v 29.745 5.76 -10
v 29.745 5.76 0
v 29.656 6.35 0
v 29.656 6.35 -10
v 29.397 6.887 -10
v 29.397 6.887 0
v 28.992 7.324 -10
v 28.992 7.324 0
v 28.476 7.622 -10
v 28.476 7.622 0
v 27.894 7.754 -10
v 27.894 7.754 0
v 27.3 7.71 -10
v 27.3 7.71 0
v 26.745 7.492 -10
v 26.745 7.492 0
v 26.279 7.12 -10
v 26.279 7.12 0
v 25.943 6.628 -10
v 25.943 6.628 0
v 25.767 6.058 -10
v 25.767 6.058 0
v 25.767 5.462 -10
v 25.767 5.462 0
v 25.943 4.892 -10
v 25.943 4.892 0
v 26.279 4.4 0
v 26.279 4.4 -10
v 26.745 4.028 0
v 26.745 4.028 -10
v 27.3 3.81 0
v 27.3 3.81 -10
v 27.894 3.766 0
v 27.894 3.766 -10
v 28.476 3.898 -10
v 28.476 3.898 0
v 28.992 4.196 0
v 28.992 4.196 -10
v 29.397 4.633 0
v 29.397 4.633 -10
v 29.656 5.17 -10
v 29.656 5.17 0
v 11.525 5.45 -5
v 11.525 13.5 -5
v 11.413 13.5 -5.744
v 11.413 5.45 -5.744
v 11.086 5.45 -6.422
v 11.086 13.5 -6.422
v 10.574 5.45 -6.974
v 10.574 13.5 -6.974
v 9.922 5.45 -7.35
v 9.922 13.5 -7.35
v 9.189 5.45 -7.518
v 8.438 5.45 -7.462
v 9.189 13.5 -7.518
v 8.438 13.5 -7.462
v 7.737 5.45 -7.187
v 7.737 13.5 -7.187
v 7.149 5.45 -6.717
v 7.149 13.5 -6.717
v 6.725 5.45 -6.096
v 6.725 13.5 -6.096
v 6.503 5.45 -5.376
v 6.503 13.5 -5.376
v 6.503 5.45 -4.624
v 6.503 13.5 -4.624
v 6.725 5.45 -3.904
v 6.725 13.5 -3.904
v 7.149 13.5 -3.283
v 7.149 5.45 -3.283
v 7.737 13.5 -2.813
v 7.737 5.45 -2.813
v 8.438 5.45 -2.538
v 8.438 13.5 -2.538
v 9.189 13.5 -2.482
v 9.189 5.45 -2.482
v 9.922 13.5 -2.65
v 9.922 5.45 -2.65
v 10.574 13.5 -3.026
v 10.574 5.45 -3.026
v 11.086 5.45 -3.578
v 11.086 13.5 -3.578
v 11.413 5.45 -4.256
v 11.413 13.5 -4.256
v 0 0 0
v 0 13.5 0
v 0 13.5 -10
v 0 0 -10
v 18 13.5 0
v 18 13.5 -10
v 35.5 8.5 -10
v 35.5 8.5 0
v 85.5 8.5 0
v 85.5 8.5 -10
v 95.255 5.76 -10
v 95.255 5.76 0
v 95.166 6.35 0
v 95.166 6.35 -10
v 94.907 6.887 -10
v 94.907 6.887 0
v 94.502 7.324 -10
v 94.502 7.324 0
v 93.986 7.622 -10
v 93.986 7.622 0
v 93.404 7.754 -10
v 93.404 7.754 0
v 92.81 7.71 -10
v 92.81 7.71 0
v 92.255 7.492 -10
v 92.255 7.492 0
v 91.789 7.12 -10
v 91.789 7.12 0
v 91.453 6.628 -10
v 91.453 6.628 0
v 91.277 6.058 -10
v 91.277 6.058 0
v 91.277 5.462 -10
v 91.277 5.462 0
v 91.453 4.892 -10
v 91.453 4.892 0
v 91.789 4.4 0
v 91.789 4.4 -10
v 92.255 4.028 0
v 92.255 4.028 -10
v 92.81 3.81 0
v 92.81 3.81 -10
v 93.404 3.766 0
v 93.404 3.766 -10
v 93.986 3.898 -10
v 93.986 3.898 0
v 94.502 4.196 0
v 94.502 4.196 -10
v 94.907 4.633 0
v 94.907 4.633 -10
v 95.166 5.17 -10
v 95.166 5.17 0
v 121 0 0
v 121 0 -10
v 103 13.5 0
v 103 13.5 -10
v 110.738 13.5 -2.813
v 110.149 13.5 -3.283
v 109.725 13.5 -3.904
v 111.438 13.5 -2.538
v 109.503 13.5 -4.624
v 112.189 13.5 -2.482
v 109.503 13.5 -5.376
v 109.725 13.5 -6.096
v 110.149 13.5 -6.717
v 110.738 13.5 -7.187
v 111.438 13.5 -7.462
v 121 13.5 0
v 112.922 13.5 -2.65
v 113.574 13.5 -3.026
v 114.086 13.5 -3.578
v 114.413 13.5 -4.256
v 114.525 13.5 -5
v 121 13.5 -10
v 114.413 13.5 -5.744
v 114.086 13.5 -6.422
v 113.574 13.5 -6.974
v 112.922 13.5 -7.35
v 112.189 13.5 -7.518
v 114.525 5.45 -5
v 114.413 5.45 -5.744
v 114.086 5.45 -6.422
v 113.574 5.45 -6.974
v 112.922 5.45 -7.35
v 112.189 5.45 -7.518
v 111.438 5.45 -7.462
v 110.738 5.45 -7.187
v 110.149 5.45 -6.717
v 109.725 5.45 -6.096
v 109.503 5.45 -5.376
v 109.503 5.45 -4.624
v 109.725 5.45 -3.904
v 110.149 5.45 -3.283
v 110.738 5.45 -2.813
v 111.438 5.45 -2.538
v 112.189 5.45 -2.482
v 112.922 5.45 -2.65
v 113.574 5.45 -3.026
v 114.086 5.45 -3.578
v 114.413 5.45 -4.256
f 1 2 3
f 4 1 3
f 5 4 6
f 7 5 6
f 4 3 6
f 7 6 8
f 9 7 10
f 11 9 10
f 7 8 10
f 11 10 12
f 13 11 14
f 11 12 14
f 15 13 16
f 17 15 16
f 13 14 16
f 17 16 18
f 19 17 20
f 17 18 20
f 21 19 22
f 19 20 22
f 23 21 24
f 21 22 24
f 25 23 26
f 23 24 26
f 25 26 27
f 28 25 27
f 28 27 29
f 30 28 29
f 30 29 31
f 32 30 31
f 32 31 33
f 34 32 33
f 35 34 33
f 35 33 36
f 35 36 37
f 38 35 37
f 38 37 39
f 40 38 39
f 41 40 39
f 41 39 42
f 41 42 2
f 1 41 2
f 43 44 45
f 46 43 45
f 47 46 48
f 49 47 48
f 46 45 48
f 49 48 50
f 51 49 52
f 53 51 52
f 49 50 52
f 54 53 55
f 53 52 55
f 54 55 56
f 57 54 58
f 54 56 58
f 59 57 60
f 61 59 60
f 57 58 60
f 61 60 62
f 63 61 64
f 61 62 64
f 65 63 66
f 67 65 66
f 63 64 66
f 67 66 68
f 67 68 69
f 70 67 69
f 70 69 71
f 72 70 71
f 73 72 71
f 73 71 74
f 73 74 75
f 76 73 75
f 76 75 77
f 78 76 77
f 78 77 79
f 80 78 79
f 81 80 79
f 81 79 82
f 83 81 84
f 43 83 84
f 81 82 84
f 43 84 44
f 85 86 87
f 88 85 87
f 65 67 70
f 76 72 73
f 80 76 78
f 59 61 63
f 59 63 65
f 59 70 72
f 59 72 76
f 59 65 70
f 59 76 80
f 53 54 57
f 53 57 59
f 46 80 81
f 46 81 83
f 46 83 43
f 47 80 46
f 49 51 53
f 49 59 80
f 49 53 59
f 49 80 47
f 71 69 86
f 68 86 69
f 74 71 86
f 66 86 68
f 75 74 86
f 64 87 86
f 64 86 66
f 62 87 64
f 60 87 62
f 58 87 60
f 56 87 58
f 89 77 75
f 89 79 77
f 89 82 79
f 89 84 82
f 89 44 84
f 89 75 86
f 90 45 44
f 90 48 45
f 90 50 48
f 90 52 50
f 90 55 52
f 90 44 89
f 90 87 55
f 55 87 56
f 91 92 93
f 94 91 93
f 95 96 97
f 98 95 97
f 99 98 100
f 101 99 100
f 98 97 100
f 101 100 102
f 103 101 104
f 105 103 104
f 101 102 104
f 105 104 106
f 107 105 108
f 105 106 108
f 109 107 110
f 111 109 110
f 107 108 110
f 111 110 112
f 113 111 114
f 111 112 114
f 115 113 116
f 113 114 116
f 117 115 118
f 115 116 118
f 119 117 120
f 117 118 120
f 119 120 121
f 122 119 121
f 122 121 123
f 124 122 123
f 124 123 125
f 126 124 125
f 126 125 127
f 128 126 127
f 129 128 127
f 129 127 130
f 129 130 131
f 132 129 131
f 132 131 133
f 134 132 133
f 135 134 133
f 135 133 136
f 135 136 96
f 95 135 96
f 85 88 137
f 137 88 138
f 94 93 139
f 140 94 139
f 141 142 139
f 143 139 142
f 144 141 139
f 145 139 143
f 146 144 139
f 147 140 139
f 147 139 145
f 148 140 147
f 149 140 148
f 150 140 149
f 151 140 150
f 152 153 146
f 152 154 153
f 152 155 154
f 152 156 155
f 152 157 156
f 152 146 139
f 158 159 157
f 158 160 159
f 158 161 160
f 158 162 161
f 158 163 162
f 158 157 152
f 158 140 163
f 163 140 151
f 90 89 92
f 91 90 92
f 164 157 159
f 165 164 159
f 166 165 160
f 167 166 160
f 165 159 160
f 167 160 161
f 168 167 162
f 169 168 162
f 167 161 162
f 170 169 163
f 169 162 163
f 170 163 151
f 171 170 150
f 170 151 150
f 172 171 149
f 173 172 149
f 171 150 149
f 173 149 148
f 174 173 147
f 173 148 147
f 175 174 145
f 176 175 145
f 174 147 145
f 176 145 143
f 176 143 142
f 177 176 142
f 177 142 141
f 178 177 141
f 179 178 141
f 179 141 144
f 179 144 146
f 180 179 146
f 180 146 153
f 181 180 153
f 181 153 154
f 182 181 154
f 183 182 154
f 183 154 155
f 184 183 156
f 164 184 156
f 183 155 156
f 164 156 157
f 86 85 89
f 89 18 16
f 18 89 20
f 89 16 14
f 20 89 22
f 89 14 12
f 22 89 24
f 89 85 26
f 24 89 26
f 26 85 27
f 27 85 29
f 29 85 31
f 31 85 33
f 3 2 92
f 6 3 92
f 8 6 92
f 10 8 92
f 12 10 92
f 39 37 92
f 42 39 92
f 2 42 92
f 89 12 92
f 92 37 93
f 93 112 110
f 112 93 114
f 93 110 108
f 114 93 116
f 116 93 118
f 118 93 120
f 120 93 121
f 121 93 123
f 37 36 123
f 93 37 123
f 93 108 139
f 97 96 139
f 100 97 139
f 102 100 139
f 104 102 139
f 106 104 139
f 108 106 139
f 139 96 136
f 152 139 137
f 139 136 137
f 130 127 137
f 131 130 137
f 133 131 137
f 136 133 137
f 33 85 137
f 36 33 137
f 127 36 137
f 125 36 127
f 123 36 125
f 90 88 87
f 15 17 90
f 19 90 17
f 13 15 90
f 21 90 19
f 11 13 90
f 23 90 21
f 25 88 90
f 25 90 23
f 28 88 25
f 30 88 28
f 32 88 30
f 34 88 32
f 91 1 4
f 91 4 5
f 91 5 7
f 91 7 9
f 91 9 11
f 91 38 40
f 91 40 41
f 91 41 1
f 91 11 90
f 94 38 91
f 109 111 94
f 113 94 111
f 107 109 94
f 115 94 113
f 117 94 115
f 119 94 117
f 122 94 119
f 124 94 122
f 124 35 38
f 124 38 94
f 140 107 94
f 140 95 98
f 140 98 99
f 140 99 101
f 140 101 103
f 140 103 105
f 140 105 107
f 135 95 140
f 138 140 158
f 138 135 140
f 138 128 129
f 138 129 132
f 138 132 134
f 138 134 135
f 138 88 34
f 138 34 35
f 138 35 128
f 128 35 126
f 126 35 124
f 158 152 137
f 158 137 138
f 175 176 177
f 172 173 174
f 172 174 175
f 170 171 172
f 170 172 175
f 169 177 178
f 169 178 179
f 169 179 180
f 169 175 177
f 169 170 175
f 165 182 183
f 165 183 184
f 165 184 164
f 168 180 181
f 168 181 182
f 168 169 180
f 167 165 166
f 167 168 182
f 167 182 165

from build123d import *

# Parameters (mm, degrees)
CROQUIS1_W              = 121
CROQUIS1_H              = 10
SALIENTE_EXTRUIR1_DEPTH = 13.5
CROQUIS2_R              = 2.525
CORTAR_EXTRUIR1_DEPTH   = 8.05
CORTAR_EXTRUIR2_DEPTH   = 20
CROQUIS4_R              = 2
CORTAR_EXTRUIR3_DEPTH   = 20


with BuildPart() as part:
    # Croquis1 → Saliente-Extruir1 (new body)
    with BuildSketch(Plane(origin=(0, 0, 0), x_dir=(1, 0, 0), z_dir=(0, 1, 0))):
        with Locations((60.5, 5)):
            Rectangle(CROQUIS1_W, CROQUIS1_H)
    extrude(amount=SALIENTE_EXTRUIR1_DEPTH)

    # Croquis2 → Cortar-Extruir1 (cut)
    with BuildSketch(Plane(origin=(0, 13.5, 0), x_dir=(1, 0, 0), z_dir=(0, 1, 0))):
        with Locations((9, 5)):
            Circle(CROQUIS2_R)
        with Locations((112, 5)):
            Circle(CROQUIS2_R)
    extrude(amount=-CORTAR_EXTRUIR1_DEPTH, mode=Mode.SUBTRACT)

    # Croquis3 → Cortar-Extruir2 (cut)
    with BuildSketch(Plane.XY):
        Polygon((103, 13.5), (18, 13.5), (35.5, 8.5), (85.5, 8.5), align=None)
    extrude(amount=-CORTAR_EXTRUIR2_DEPTH, mode=Mode.SUBTRACT)

    # Croquis4 → Cortar-Extruir3 (cut)
    with BuildSketch(Plane.XY):
        with Locations((27.745, 5.76)):
            Circle(CROQUIS4_R)
        with Locations((93.255, 5.76)):
            Circle(CROQUIS4_R)
    extrude(amount=-CORTAR_EXTRUIR3_DEPTH, mode=Mode.SUBTRACT)


solid = part.part
